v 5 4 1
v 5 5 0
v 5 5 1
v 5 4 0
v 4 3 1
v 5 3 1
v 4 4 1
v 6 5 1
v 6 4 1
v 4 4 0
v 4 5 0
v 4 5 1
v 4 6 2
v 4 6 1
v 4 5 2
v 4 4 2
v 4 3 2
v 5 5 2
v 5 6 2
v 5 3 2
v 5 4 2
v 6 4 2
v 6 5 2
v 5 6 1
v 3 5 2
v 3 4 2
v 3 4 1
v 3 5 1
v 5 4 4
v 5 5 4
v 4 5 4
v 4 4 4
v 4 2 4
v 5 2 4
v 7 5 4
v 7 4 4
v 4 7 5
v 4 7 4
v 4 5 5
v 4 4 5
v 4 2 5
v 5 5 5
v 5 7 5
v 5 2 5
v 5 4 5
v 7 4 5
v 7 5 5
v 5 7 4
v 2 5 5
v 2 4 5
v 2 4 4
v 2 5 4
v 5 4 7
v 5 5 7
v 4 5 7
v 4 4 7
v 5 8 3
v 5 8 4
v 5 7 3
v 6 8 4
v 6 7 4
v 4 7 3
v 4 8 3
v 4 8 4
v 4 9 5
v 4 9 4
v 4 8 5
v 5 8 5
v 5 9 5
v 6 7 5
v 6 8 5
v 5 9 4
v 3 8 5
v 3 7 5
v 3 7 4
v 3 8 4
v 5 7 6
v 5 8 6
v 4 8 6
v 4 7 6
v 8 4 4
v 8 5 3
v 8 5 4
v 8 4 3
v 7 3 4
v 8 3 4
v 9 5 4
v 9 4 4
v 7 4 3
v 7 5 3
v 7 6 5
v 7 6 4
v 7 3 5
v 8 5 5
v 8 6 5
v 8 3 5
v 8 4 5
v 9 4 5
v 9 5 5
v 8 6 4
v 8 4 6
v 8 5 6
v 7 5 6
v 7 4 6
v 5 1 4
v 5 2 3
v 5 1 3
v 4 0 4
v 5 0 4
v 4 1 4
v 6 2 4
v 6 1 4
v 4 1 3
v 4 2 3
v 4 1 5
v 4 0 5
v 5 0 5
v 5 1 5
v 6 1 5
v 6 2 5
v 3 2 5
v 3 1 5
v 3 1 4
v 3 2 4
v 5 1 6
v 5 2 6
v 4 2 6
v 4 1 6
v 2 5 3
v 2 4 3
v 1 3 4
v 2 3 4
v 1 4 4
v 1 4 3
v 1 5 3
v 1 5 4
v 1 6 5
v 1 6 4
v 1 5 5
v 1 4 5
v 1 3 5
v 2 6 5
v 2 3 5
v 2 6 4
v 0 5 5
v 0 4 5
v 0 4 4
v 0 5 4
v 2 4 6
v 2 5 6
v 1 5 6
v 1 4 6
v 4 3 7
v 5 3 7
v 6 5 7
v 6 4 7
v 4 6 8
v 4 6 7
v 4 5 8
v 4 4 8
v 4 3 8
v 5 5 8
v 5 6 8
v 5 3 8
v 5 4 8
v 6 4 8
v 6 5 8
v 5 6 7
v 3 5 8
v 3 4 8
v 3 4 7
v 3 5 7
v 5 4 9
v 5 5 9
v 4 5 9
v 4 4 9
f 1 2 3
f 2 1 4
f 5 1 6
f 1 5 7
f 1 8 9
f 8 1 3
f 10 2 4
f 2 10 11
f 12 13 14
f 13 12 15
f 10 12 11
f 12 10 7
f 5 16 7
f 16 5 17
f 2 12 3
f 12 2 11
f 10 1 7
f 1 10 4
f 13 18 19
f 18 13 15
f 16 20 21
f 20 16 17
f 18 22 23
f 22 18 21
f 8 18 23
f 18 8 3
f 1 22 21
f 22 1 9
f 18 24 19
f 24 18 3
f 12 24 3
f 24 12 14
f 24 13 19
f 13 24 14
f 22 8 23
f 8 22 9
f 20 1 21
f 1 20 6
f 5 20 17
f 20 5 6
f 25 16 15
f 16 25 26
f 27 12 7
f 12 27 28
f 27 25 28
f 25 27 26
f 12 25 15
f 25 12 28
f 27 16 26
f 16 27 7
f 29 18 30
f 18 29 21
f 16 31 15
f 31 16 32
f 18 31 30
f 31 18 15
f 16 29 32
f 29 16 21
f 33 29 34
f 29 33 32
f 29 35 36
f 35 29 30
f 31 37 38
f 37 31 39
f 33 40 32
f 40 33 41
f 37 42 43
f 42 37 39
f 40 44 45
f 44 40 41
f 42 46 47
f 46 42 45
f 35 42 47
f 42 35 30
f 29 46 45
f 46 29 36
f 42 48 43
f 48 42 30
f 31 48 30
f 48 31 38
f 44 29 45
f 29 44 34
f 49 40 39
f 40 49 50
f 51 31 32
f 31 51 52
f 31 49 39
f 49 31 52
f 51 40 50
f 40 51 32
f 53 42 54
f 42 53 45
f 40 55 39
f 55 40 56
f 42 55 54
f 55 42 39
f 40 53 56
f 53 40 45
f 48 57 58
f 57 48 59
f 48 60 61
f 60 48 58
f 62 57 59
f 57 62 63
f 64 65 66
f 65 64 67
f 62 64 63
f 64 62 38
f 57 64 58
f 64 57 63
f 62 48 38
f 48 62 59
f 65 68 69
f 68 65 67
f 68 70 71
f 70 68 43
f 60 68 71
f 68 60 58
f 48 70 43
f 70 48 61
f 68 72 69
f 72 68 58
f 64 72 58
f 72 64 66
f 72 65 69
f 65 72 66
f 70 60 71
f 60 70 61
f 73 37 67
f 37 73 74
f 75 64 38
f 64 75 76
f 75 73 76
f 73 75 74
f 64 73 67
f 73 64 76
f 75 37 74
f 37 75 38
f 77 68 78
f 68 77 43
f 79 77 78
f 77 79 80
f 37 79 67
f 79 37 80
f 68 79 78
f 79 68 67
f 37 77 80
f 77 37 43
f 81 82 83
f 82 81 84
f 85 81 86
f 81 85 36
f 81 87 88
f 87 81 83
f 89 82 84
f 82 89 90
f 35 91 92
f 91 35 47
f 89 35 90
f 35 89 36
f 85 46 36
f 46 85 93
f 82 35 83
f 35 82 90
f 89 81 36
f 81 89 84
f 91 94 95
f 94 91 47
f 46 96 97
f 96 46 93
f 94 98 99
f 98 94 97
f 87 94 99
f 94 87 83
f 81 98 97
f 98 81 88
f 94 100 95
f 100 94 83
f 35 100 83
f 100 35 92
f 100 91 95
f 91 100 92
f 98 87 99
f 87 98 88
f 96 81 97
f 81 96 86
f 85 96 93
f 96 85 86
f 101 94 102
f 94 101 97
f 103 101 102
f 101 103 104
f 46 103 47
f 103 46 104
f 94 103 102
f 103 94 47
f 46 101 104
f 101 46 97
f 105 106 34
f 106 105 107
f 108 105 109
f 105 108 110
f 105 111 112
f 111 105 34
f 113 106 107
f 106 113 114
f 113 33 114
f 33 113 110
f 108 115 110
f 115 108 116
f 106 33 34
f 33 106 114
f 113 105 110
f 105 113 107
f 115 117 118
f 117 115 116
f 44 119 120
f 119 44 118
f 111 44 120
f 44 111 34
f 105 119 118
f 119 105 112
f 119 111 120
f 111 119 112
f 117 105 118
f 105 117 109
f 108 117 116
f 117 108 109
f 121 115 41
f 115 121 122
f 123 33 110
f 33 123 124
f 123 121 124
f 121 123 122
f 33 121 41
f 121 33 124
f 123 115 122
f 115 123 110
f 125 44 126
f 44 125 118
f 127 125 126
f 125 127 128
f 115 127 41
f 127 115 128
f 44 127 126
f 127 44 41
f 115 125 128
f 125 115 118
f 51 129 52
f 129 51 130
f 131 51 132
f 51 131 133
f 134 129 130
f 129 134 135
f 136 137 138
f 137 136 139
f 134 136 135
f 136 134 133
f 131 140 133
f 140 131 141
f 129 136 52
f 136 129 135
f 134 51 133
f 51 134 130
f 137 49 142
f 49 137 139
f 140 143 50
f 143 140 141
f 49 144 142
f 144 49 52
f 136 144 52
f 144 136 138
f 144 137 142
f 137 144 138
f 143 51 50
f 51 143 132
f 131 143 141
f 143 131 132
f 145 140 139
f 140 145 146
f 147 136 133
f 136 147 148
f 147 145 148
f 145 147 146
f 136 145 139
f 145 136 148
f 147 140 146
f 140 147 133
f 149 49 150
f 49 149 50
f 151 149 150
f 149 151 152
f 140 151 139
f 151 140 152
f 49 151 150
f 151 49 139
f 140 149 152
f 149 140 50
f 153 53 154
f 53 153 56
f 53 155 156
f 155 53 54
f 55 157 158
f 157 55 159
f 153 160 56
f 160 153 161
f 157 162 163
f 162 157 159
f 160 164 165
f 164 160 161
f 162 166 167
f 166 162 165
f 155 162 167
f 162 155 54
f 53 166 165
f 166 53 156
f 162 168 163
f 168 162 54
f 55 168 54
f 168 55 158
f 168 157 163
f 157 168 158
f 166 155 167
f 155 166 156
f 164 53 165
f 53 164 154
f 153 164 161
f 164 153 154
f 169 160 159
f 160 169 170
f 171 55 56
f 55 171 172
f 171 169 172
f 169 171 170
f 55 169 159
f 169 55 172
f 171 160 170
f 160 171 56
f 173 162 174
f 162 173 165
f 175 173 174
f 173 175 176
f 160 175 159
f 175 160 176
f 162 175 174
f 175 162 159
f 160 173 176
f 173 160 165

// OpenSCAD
// Reverse Menger Sponge

module reverse_menger_sponge(level) {
    if(level == 0) {
        cube([  1,  1,  1]);
    } else {
        coord_1 = pow(3, (level - 1));
        coord_2 = 2 * coord_1;
        
        translate([coord_1, coord_1, 0]) reverse_menger_sponge(level - 1);

        translate([coord_1, coord_1, coord_1]) reverse_menger_sponge(level - 1);
        translate([coord_1, coord_2, coord_1]) reverse_menger_sponge(level - 1);
        translate([coord_2, coord_1, coord_1]) reverse_menger_sponge(level - 1);
        translate([coord_1, 0, coord_1]) reverse_menger_sponge(level - 1);
        translate([0, coord_1, coord_1]) reverse_menger_sponge(level - 1);
        
        translate([coord_1, coord_1, coord_2]) reverse_menger_sponge(level - 1);
    }
}

reverse_menger_sponge(2);
